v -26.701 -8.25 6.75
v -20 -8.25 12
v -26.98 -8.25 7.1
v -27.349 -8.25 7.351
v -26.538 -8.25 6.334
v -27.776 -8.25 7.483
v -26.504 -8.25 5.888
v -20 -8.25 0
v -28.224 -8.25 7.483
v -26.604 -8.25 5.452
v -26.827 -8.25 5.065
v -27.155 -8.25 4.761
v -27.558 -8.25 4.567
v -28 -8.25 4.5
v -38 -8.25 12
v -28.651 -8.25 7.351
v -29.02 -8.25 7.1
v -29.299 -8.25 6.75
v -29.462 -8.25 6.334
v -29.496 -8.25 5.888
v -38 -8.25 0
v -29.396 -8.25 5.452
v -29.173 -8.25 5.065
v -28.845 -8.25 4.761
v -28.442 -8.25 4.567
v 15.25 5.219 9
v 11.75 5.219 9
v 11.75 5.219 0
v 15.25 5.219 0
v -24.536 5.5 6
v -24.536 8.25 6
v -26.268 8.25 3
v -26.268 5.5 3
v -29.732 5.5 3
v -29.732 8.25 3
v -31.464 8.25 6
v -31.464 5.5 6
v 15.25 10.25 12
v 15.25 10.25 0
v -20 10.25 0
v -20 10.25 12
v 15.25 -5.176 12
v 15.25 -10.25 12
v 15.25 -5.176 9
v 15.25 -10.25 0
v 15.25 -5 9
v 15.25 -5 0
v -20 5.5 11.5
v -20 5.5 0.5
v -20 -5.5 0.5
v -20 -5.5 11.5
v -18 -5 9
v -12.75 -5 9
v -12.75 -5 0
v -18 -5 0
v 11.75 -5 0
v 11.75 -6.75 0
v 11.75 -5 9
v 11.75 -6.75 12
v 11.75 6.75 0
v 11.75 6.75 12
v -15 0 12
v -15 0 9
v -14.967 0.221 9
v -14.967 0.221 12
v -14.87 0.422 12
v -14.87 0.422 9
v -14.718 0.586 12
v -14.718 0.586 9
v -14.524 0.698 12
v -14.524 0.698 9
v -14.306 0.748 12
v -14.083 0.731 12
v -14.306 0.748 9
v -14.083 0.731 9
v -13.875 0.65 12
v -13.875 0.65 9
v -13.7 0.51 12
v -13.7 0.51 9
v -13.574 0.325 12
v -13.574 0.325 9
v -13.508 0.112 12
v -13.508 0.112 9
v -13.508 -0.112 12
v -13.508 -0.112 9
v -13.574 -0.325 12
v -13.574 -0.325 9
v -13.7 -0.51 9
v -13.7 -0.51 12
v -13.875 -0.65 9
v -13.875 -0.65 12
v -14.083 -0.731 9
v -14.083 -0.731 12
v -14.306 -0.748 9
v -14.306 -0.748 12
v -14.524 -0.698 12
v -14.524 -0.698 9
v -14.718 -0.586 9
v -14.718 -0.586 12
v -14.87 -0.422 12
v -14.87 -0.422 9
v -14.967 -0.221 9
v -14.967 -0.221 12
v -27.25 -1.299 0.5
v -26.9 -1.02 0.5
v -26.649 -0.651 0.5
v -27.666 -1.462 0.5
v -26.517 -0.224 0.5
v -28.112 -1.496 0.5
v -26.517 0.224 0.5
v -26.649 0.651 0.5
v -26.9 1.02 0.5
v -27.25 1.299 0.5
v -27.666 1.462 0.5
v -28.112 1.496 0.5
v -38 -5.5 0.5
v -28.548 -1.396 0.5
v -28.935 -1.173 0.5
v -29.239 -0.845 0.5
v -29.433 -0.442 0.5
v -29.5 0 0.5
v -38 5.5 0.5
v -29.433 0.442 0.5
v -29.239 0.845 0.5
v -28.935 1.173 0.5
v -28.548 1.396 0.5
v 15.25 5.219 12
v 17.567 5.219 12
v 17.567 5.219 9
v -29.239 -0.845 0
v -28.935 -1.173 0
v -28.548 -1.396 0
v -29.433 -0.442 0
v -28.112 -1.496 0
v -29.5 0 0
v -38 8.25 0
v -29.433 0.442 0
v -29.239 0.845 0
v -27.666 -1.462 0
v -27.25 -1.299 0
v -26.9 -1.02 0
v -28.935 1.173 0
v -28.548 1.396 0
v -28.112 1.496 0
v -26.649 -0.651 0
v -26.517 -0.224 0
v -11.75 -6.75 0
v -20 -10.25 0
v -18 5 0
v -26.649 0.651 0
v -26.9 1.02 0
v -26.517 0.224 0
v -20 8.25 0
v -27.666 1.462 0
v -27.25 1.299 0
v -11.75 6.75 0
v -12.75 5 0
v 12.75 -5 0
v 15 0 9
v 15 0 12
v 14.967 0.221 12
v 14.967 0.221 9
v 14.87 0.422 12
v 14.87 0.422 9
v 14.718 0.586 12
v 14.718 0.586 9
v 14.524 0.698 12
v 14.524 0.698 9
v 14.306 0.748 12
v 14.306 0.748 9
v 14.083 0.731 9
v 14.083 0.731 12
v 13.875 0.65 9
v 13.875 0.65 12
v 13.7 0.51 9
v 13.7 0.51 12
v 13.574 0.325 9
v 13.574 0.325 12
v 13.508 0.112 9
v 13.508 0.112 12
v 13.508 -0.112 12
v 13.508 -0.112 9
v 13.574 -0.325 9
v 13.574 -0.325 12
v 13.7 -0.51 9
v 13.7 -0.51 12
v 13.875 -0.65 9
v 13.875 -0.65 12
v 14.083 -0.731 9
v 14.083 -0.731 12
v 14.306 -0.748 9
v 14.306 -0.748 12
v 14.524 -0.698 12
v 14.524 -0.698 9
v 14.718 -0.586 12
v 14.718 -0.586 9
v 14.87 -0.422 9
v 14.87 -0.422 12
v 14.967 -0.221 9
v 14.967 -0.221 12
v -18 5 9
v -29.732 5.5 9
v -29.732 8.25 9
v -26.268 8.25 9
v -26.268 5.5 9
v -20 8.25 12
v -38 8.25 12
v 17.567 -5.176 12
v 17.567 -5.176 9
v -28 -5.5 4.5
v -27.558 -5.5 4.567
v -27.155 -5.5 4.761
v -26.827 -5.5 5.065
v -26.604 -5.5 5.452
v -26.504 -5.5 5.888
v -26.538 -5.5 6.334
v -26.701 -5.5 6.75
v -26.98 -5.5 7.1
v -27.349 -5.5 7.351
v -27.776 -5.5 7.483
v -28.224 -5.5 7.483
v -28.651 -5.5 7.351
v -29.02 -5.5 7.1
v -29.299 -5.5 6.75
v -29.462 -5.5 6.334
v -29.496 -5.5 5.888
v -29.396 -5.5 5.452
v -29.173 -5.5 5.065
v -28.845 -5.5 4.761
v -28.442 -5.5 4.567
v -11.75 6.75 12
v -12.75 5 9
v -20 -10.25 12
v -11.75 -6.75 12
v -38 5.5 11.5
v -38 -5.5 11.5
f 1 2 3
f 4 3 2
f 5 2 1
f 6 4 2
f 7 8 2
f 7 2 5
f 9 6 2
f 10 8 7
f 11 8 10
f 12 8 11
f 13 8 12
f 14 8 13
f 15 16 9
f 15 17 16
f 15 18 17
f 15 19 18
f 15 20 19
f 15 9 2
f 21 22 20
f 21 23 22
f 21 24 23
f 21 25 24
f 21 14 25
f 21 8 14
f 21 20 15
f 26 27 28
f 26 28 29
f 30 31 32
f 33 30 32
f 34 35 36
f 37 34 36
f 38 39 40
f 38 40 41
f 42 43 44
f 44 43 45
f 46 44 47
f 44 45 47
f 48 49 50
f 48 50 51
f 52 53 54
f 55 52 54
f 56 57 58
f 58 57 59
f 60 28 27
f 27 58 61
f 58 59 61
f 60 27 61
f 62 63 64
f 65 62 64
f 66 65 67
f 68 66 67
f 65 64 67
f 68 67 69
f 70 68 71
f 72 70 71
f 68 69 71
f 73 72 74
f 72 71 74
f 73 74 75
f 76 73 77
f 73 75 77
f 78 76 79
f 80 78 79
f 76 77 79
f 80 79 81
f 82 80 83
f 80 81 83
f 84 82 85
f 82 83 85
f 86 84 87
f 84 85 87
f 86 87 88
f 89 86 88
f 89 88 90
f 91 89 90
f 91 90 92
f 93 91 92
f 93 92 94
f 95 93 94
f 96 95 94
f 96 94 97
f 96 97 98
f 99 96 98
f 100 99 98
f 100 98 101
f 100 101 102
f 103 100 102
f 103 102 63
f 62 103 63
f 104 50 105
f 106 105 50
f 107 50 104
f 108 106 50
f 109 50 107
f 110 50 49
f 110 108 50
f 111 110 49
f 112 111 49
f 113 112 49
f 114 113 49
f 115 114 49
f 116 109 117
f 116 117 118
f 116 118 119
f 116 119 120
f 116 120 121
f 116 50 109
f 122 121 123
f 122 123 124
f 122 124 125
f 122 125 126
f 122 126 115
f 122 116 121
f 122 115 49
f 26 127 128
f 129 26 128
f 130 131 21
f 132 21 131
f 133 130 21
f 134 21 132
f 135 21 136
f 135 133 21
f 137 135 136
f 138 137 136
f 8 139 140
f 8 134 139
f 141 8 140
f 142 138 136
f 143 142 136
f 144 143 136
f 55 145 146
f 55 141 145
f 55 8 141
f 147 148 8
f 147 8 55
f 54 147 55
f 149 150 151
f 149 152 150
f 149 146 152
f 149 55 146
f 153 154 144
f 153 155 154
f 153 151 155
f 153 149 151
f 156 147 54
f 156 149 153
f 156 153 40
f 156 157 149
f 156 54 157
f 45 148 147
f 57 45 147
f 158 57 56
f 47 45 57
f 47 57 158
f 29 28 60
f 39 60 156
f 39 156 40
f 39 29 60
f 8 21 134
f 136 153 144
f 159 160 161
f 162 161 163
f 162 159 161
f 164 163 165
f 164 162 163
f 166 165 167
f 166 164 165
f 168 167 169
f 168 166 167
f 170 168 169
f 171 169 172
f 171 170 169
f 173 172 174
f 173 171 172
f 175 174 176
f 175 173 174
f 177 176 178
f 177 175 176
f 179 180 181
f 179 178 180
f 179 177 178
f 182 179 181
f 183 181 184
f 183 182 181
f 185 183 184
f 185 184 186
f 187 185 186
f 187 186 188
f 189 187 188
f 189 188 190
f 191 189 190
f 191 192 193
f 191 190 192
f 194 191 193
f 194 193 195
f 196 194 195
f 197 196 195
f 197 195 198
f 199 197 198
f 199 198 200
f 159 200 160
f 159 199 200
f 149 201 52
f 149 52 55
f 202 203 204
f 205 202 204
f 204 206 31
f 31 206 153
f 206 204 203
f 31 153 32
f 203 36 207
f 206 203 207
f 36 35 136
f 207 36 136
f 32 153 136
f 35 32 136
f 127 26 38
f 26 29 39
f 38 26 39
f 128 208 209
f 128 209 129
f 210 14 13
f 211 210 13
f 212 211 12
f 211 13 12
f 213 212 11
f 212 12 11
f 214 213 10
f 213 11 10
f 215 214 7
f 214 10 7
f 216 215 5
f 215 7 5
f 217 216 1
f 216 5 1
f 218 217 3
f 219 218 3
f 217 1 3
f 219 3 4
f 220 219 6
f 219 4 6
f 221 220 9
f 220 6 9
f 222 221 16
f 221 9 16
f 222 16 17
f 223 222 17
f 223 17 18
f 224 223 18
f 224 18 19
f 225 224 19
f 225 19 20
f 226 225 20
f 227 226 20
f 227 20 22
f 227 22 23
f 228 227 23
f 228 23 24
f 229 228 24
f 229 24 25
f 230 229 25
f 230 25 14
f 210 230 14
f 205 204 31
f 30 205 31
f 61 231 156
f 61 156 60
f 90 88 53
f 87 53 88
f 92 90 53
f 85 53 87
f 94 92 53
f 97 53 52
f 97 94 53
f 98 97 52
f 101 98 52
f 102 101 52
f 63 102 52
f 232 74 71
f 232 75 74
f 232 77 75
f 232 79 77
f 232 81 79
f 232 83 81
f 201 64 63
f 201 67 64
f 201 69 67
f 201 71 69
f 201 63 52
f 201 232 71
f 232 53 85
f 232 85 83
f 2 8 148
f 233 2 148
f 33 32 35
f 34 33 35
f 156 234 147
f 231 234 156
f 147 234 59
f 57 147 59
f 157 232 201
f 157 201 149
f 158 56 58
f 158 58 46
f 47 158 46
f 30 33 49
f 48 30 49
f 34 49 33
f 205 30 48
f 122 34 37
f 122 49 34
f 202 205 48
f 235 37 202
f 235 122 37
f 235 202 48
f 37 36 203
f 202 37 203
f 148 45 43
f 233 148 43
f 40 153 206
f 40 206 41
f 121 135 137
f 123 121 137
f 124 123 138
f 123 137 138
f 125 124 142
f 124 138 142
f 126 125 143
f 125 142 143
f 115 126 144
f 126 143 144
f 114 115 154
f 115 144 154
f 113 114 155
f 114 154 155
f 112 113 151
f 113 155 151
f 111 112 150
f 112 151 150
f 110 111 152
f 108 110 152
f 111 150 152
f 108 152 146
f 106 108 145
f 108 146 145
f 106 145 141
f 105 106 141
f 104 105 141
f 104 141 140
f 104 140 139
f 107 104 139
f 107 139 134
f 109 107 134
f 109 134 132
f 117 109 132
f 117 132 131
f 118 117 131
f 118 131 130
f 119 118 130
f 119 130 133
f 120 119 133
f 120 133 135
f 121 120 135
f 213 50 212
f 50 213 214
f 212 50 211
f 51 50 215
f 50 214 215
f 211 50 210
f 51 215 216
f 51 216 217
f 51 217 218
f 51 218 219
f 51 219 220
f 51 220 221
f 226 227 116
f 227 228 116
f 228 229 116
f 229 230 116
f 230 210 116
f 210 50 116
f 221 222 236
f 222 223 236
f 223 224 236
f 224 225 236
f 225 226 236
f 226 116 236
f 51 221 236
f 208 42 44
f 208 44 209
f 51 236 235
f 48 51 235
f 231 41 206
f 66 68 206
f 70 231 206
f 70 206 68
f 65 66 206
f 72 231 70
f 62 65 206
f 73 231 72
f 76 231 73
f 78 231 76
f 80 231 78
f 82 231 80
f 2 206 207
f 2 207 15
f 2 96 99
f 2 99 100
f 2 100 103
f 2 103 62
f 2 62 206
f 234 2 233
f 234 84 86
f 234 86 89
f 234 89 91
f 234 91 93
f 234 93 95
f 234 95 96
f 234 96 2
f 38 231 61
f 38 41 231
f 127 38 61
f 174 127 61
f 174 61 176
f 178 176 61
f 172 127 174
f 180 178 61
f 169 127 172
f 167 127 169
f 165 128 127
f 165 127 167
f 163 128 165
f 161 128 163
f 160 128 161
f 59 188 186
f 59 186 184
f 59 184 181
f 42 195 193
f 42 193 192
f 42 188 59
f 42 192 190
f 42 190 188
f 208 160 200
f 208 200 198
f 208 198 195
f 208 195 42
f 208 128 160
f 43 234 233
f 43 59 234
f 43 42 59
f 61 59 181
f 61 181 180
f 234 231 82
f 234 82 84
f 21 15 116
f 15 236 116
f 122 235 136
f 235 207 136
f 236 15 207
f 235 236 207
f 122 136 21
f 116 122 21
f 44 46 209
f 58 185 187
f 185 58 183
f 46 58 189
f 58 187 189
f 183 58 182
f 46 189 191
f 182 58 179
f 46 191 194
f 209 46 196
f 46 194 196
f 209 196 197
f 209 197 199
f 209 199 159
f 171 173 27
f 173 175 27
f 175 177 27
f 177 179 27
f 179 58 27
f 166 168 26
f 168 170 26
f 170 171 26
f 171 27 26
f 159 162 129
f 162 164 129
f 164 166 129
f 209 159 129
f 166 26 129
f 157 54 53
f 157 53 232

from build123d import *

# Parameters (mm, degrees)
SKETCH_2_W           = 30.5
SKETCH_2_H           = 20.5
SKETCH_2_W_2         = 22.5
SKETCH_2_H_2         = 12.5
EXTRUDE_1_DEPTH      = 12
SKETCH_3_W           = 2.75
SKETCH_3_H           = 10
EXTRUDE_2_DEPTH      = 3
SKETCH_4_W           = 4.940698383
SKETCH_4_H           = 10
CUT_EXTRUDE_1_DEPTH  = 9
EXTRUDE_3_DEPTH      = 20
EXTRUDE_4_REACH      = 38.805
SKETCH_7_R           = 0.75
CUT_EXTRUDE_2_DEPTH  = 41.374032496
SKETCH_8_W           = 10
SKETCH_8_H           = 10
CUT_EXTRUDE_3_DEPTH  = 18
SKETCH_10_W          = 23.106147985
SKETCH_10_H          = 7.754593222
CUT_EXTRUDE_4_DEPTH  = 42.146840705
SKETCH_11_R          = 1.5
CUT_EXTRUDE_5_DEPTH  = 44.934610502
CUT_EXTRUDE_6_REACH  = 60.181
SKETCH_12_W          = 11
SKETCH_12_H          = 11
SKETCH_13_W          = 23.5
SKETCH_13_H          = 13.5
CUT_EXTRUDE_7_DEPTH  = 42.146840705
SKETCH_14_W          = 9.129424231
SKETCH_14_H          = 10.218893611
CUT_EXTRUDE_8_DEPTH  = 42.146840705
CUT_EXTRUDE_9_REACH  = 45.935
CUT_EXTRUDE_10_REACH = 43.147
SKETCH_16_R          = 1.5
SKETCH_17_W          = 5.816970736
SKETCH_17_H          = 10.394960723
EXTRUDE_5_DEPTH      = 3


with BuildPart() as part:
    # 草图2 → 凸台-拉伸1 (new body)
    with BuildSketch(Plane.XY):
        Rectangle(SKETCH_2_W, SKETCH_2_H)
        Rectangle(SKETCH_2_W_2, SKETCH_2_H_2, mode=Mode.SUBTRACT)
    extrude(amount=EXTRUDE_1_DEPTH)

    # 草图3 → 凸台-拉伸2 (add)
    with BuildSketch(Plane.XY.offset(12)):
        with Locations((-16.625, 0)):
            Rectangle(SKETCH_3_W, SKETCH_3_H)
    extrude_2 = extrude(amount=-EXTRUDE_2_DEPTH)

    # 镜向1: 凸台-拉伸2 across plane
    add(extrude_2.mirror(Plane(origin=(0, 0, 0), x_dir=(0, 0, 1), z_dir=(1, 0, 0))))

    # 草图4 → 切除-拉伸1 (cut)
    with BuildSketch(Plane(origin=(0, 0, 0), x_dir=(-1, 0, 0), z_dir=(0, 0, -1))):
        with Locations((15.220349192, 0)):
            Rectangle(SKETCH_4_W, SKETCH_4_H)
    cut_extrude_1 = extrude(amount=-CUT_EXTRUDE_1_DEPTH, mode=Mode.SUBTRACT)

    # 镜向2: 切除-拉伸1 across plane
    add(cut_extrude_1.mirror(Plane(origin=(0, 0, 0), x_dir=(0, 0, 1), z_dir=(1, 0, 0))), mode=Mode.SUBTRACT)

    # 草图5 → 凸台-拉伸3 (add)
    with BuildSketch(Plane.ZY.offset(18)):
        Polygon((12, 10.25), (12, 5), (12, -5), (12, -10.25), (0, -10.25), (0, -5), (0, 5), (0, 10.25), align=None)
    extrude(amount=EXTRUDE_3_DEPTH)

    # 草图6 → 凸台-拉伸4 (add, up to next)
    with BuildSketch(Plane.ZY.offset(15.25), mode=Mode.PRIVATE) as extrude_4_sk1:
        Polygon((12, -5), (9, -5), (0, -5), (0, -10.25), (12, -10.25), align=None)
    extrude_4_tool1 = extrude(extrude_4_sk1.sketch, amount=EXTRUDE_4_REACH, mode=Mode.PRIVATE) - part.part
    extrude_4 = extrude_4_tool1.solids().sort_by_distance((-15.25, -7.625, 6))[0]
    add(extrude_4)

    # 镜向3: 凸台-拉伸4 across plane
    add(extrude_4.mirror(Plane.ZX))

    # 草图7 → 切除-拉伸2 (cut, through all)
    with BuildSketch(Plane(origin=(0, 0, 9), x_dir=(-1, 0, 0), z_dir=(0, 0, -1))):
        with Locations((14.25, 0)):
            Circle(SKETCH_7_R)
    cut_extrude_2 = extrude(amount=-CUT_EXTRUDE_2_DEPTH, mode=Mode.SUBTRACT)

    # 草图8 → 切除-拉伸3 (cut)
    with BuildSketch(Plane.ZY.offset(38)):
        with Locations((6, 0)):
            Rectangle(SKETCH_8_W, SKETCH_8_H)
    extrude(amount=-CUT_EXTRUDE_3_DEPTH, mode=Mode.SUBTRACT)

    # 草图10 → 切除-拉伸4 (cut, through all)
    with BuildSketch(Plane(origin=(0, 0, 0), x_dir=(-1, 0, 0), z_dir=(0, 0, -1))):
        with Locations((31.553073992, 12.127296611)):
            Rectangle(SKETCH_10_W, SKETCH_10_H)
    cut_extrude_4 = extrude(amount=-CUT_EXTRUDE_4_DEPTH, mode=Mode.SUBTRACT)

    # 镜向4: 切除-拉伸4 across plane
    add(cut_extrude_4.mirror(Plane.ZX), mode=Mode.SUBTRACT)

    # 草图11 → 切除-拉伸5 (cut, through all)
    with BuildSketch(Plane.XZ.offset(8.25)):
        with Locations(Location((-28, 6, 0), (0, 0, 270))):
            Circle(SKETCH_11_R)
    extrude(amount=-CUT_EXTRUDE_5_DEPTH, mode=Mode.SUBTRACT)

    # 镜向5: 切除-拉伸2 across plane
    add(cut_extrude_2.mirror(Plane(origin=(0, 0, 0), x_dir=(0, 0, 1), z_dir=(1, 0, 0))), mode=Mode.SUBTRACT)

    # 切除-拉伸6: up to this face of the body (flat: up to its plane)
    cut_extrude_6_end = Plane(part.part.faces().sort_by_distance((-20, 0, 6))[0])
    # 草图12 → 切除-拉伸6 (cut, up to the picked face)
    with BuildSketch(Plane.ZY.offset(38), mode=Mode.PRIVATE) as cut_extrude_6_sk1:
        with Locations((6, 0)):
            Rectangle(SKETCH_12_W, SKETCH_12_H)
    cut_extrude_6_tool1 = split(extrude(cut_extrude_6_sk1.sketch, amount=-CUT_EXTRUDE_6_REACH, mode=Mode.PRIVATE), bisect_by=cut_extrude_6_end, keep=Keep.BOTH, mode=Mode.PRIVATE)
    add(cut_extrude_6_tool1.solids().sort_by(Axis((-38, 0, 6), (1, 0, 0)))[0], mode=Mode.SUBTRACT)

    # 草图13 → 切除-拉伸7 (cut, through all)
    with BuildSketch(Plane.XY.offset(12)):
        Rectangle(SKETCH_13_W, SKETCH_13_H)
    extrude(amount=-CUT_EXTRUDE_7_DEPTH, mode=Mode.SUBTRACT)

    # 草图14 → 切除-拉伸8 (cut, through all)
    with BuildSketch(Plane.XY.offset(12)):
        with Locations((13.435287884, 0.109446806)):
            Rectangle(SKETCH_14_W, SKETCH_14_H)
    extrude(amount=-CUT_EXTRUDE_8_DEPTH, mode=Mode.SUBTRACT)

    # 草图15 → 切除-拉伸9 (cut, up to next)
    with BuildSketch(Plane(origin=(0, 8.25, 0), x_dir=(1, 0, 0), z_dir=(0, 1, 0)), mode=Mode.PRIVATE) as cut_extrude_9_sk1:
        Polygon((-24.535898385, -6), (-26.267949192, -3), (-29.732050808, -3), (-31.464101615, -6), (-29.732050808, -9), (-26.267949192, -9), align=None)
    cut_extrude_9_tool1 = extrude(cut_extrude_9_sk1.sketch, amount=-CUT_EXTRUDE_9_REACH, mode=Mode.PRIVATE) & part.part
    add(cut_extrude_9_tool1.solids().sort_by_distance((-28, 8.25, 6))[0], mode=Mode.SUBTRACT)

    # 草图16 → 切除-拉伸10 (cut, up to next)
    with BuildSketch(Plane(origin=(0, 0, 0), x_dir=(-1, 0, 0), z_dir=(0, 0, -1)), mode=Mode.PRIVATE) as cut_extrude_10_sk1:
        with Locations((28, 0)):
            Circle(SKETCH_16_R)
    cut_extrude_10_tool1 = extrude(cut_extrude_10_sk1.sketch, amount=-CUT_EXTRUDE_10_REACH, mode=Mode.PRIVATE) & part.part
    add(cut_extrude_10_tool1.solids().sort_by_distance((-28, 0, 0))[0], mode=Mode.SUBTRACT)

    # 草图17 → 凸台-拉伸5 (add)
    with BuildSketch(Plane.XY.offset(12)):
        with Locations((14.658485368, 0.02141325)):
            Rectangle(SKETCH_17_W, SKETCH_17_H)
    extrude(amount=-EXTRUDE_5_DEPTH)

    # 镜向6: 切除-拉伸2 across plane
    add(cut_extrude_2.mirror(Plane.ZY), mode=Mode.SUBTRACT)


solid = part.part
